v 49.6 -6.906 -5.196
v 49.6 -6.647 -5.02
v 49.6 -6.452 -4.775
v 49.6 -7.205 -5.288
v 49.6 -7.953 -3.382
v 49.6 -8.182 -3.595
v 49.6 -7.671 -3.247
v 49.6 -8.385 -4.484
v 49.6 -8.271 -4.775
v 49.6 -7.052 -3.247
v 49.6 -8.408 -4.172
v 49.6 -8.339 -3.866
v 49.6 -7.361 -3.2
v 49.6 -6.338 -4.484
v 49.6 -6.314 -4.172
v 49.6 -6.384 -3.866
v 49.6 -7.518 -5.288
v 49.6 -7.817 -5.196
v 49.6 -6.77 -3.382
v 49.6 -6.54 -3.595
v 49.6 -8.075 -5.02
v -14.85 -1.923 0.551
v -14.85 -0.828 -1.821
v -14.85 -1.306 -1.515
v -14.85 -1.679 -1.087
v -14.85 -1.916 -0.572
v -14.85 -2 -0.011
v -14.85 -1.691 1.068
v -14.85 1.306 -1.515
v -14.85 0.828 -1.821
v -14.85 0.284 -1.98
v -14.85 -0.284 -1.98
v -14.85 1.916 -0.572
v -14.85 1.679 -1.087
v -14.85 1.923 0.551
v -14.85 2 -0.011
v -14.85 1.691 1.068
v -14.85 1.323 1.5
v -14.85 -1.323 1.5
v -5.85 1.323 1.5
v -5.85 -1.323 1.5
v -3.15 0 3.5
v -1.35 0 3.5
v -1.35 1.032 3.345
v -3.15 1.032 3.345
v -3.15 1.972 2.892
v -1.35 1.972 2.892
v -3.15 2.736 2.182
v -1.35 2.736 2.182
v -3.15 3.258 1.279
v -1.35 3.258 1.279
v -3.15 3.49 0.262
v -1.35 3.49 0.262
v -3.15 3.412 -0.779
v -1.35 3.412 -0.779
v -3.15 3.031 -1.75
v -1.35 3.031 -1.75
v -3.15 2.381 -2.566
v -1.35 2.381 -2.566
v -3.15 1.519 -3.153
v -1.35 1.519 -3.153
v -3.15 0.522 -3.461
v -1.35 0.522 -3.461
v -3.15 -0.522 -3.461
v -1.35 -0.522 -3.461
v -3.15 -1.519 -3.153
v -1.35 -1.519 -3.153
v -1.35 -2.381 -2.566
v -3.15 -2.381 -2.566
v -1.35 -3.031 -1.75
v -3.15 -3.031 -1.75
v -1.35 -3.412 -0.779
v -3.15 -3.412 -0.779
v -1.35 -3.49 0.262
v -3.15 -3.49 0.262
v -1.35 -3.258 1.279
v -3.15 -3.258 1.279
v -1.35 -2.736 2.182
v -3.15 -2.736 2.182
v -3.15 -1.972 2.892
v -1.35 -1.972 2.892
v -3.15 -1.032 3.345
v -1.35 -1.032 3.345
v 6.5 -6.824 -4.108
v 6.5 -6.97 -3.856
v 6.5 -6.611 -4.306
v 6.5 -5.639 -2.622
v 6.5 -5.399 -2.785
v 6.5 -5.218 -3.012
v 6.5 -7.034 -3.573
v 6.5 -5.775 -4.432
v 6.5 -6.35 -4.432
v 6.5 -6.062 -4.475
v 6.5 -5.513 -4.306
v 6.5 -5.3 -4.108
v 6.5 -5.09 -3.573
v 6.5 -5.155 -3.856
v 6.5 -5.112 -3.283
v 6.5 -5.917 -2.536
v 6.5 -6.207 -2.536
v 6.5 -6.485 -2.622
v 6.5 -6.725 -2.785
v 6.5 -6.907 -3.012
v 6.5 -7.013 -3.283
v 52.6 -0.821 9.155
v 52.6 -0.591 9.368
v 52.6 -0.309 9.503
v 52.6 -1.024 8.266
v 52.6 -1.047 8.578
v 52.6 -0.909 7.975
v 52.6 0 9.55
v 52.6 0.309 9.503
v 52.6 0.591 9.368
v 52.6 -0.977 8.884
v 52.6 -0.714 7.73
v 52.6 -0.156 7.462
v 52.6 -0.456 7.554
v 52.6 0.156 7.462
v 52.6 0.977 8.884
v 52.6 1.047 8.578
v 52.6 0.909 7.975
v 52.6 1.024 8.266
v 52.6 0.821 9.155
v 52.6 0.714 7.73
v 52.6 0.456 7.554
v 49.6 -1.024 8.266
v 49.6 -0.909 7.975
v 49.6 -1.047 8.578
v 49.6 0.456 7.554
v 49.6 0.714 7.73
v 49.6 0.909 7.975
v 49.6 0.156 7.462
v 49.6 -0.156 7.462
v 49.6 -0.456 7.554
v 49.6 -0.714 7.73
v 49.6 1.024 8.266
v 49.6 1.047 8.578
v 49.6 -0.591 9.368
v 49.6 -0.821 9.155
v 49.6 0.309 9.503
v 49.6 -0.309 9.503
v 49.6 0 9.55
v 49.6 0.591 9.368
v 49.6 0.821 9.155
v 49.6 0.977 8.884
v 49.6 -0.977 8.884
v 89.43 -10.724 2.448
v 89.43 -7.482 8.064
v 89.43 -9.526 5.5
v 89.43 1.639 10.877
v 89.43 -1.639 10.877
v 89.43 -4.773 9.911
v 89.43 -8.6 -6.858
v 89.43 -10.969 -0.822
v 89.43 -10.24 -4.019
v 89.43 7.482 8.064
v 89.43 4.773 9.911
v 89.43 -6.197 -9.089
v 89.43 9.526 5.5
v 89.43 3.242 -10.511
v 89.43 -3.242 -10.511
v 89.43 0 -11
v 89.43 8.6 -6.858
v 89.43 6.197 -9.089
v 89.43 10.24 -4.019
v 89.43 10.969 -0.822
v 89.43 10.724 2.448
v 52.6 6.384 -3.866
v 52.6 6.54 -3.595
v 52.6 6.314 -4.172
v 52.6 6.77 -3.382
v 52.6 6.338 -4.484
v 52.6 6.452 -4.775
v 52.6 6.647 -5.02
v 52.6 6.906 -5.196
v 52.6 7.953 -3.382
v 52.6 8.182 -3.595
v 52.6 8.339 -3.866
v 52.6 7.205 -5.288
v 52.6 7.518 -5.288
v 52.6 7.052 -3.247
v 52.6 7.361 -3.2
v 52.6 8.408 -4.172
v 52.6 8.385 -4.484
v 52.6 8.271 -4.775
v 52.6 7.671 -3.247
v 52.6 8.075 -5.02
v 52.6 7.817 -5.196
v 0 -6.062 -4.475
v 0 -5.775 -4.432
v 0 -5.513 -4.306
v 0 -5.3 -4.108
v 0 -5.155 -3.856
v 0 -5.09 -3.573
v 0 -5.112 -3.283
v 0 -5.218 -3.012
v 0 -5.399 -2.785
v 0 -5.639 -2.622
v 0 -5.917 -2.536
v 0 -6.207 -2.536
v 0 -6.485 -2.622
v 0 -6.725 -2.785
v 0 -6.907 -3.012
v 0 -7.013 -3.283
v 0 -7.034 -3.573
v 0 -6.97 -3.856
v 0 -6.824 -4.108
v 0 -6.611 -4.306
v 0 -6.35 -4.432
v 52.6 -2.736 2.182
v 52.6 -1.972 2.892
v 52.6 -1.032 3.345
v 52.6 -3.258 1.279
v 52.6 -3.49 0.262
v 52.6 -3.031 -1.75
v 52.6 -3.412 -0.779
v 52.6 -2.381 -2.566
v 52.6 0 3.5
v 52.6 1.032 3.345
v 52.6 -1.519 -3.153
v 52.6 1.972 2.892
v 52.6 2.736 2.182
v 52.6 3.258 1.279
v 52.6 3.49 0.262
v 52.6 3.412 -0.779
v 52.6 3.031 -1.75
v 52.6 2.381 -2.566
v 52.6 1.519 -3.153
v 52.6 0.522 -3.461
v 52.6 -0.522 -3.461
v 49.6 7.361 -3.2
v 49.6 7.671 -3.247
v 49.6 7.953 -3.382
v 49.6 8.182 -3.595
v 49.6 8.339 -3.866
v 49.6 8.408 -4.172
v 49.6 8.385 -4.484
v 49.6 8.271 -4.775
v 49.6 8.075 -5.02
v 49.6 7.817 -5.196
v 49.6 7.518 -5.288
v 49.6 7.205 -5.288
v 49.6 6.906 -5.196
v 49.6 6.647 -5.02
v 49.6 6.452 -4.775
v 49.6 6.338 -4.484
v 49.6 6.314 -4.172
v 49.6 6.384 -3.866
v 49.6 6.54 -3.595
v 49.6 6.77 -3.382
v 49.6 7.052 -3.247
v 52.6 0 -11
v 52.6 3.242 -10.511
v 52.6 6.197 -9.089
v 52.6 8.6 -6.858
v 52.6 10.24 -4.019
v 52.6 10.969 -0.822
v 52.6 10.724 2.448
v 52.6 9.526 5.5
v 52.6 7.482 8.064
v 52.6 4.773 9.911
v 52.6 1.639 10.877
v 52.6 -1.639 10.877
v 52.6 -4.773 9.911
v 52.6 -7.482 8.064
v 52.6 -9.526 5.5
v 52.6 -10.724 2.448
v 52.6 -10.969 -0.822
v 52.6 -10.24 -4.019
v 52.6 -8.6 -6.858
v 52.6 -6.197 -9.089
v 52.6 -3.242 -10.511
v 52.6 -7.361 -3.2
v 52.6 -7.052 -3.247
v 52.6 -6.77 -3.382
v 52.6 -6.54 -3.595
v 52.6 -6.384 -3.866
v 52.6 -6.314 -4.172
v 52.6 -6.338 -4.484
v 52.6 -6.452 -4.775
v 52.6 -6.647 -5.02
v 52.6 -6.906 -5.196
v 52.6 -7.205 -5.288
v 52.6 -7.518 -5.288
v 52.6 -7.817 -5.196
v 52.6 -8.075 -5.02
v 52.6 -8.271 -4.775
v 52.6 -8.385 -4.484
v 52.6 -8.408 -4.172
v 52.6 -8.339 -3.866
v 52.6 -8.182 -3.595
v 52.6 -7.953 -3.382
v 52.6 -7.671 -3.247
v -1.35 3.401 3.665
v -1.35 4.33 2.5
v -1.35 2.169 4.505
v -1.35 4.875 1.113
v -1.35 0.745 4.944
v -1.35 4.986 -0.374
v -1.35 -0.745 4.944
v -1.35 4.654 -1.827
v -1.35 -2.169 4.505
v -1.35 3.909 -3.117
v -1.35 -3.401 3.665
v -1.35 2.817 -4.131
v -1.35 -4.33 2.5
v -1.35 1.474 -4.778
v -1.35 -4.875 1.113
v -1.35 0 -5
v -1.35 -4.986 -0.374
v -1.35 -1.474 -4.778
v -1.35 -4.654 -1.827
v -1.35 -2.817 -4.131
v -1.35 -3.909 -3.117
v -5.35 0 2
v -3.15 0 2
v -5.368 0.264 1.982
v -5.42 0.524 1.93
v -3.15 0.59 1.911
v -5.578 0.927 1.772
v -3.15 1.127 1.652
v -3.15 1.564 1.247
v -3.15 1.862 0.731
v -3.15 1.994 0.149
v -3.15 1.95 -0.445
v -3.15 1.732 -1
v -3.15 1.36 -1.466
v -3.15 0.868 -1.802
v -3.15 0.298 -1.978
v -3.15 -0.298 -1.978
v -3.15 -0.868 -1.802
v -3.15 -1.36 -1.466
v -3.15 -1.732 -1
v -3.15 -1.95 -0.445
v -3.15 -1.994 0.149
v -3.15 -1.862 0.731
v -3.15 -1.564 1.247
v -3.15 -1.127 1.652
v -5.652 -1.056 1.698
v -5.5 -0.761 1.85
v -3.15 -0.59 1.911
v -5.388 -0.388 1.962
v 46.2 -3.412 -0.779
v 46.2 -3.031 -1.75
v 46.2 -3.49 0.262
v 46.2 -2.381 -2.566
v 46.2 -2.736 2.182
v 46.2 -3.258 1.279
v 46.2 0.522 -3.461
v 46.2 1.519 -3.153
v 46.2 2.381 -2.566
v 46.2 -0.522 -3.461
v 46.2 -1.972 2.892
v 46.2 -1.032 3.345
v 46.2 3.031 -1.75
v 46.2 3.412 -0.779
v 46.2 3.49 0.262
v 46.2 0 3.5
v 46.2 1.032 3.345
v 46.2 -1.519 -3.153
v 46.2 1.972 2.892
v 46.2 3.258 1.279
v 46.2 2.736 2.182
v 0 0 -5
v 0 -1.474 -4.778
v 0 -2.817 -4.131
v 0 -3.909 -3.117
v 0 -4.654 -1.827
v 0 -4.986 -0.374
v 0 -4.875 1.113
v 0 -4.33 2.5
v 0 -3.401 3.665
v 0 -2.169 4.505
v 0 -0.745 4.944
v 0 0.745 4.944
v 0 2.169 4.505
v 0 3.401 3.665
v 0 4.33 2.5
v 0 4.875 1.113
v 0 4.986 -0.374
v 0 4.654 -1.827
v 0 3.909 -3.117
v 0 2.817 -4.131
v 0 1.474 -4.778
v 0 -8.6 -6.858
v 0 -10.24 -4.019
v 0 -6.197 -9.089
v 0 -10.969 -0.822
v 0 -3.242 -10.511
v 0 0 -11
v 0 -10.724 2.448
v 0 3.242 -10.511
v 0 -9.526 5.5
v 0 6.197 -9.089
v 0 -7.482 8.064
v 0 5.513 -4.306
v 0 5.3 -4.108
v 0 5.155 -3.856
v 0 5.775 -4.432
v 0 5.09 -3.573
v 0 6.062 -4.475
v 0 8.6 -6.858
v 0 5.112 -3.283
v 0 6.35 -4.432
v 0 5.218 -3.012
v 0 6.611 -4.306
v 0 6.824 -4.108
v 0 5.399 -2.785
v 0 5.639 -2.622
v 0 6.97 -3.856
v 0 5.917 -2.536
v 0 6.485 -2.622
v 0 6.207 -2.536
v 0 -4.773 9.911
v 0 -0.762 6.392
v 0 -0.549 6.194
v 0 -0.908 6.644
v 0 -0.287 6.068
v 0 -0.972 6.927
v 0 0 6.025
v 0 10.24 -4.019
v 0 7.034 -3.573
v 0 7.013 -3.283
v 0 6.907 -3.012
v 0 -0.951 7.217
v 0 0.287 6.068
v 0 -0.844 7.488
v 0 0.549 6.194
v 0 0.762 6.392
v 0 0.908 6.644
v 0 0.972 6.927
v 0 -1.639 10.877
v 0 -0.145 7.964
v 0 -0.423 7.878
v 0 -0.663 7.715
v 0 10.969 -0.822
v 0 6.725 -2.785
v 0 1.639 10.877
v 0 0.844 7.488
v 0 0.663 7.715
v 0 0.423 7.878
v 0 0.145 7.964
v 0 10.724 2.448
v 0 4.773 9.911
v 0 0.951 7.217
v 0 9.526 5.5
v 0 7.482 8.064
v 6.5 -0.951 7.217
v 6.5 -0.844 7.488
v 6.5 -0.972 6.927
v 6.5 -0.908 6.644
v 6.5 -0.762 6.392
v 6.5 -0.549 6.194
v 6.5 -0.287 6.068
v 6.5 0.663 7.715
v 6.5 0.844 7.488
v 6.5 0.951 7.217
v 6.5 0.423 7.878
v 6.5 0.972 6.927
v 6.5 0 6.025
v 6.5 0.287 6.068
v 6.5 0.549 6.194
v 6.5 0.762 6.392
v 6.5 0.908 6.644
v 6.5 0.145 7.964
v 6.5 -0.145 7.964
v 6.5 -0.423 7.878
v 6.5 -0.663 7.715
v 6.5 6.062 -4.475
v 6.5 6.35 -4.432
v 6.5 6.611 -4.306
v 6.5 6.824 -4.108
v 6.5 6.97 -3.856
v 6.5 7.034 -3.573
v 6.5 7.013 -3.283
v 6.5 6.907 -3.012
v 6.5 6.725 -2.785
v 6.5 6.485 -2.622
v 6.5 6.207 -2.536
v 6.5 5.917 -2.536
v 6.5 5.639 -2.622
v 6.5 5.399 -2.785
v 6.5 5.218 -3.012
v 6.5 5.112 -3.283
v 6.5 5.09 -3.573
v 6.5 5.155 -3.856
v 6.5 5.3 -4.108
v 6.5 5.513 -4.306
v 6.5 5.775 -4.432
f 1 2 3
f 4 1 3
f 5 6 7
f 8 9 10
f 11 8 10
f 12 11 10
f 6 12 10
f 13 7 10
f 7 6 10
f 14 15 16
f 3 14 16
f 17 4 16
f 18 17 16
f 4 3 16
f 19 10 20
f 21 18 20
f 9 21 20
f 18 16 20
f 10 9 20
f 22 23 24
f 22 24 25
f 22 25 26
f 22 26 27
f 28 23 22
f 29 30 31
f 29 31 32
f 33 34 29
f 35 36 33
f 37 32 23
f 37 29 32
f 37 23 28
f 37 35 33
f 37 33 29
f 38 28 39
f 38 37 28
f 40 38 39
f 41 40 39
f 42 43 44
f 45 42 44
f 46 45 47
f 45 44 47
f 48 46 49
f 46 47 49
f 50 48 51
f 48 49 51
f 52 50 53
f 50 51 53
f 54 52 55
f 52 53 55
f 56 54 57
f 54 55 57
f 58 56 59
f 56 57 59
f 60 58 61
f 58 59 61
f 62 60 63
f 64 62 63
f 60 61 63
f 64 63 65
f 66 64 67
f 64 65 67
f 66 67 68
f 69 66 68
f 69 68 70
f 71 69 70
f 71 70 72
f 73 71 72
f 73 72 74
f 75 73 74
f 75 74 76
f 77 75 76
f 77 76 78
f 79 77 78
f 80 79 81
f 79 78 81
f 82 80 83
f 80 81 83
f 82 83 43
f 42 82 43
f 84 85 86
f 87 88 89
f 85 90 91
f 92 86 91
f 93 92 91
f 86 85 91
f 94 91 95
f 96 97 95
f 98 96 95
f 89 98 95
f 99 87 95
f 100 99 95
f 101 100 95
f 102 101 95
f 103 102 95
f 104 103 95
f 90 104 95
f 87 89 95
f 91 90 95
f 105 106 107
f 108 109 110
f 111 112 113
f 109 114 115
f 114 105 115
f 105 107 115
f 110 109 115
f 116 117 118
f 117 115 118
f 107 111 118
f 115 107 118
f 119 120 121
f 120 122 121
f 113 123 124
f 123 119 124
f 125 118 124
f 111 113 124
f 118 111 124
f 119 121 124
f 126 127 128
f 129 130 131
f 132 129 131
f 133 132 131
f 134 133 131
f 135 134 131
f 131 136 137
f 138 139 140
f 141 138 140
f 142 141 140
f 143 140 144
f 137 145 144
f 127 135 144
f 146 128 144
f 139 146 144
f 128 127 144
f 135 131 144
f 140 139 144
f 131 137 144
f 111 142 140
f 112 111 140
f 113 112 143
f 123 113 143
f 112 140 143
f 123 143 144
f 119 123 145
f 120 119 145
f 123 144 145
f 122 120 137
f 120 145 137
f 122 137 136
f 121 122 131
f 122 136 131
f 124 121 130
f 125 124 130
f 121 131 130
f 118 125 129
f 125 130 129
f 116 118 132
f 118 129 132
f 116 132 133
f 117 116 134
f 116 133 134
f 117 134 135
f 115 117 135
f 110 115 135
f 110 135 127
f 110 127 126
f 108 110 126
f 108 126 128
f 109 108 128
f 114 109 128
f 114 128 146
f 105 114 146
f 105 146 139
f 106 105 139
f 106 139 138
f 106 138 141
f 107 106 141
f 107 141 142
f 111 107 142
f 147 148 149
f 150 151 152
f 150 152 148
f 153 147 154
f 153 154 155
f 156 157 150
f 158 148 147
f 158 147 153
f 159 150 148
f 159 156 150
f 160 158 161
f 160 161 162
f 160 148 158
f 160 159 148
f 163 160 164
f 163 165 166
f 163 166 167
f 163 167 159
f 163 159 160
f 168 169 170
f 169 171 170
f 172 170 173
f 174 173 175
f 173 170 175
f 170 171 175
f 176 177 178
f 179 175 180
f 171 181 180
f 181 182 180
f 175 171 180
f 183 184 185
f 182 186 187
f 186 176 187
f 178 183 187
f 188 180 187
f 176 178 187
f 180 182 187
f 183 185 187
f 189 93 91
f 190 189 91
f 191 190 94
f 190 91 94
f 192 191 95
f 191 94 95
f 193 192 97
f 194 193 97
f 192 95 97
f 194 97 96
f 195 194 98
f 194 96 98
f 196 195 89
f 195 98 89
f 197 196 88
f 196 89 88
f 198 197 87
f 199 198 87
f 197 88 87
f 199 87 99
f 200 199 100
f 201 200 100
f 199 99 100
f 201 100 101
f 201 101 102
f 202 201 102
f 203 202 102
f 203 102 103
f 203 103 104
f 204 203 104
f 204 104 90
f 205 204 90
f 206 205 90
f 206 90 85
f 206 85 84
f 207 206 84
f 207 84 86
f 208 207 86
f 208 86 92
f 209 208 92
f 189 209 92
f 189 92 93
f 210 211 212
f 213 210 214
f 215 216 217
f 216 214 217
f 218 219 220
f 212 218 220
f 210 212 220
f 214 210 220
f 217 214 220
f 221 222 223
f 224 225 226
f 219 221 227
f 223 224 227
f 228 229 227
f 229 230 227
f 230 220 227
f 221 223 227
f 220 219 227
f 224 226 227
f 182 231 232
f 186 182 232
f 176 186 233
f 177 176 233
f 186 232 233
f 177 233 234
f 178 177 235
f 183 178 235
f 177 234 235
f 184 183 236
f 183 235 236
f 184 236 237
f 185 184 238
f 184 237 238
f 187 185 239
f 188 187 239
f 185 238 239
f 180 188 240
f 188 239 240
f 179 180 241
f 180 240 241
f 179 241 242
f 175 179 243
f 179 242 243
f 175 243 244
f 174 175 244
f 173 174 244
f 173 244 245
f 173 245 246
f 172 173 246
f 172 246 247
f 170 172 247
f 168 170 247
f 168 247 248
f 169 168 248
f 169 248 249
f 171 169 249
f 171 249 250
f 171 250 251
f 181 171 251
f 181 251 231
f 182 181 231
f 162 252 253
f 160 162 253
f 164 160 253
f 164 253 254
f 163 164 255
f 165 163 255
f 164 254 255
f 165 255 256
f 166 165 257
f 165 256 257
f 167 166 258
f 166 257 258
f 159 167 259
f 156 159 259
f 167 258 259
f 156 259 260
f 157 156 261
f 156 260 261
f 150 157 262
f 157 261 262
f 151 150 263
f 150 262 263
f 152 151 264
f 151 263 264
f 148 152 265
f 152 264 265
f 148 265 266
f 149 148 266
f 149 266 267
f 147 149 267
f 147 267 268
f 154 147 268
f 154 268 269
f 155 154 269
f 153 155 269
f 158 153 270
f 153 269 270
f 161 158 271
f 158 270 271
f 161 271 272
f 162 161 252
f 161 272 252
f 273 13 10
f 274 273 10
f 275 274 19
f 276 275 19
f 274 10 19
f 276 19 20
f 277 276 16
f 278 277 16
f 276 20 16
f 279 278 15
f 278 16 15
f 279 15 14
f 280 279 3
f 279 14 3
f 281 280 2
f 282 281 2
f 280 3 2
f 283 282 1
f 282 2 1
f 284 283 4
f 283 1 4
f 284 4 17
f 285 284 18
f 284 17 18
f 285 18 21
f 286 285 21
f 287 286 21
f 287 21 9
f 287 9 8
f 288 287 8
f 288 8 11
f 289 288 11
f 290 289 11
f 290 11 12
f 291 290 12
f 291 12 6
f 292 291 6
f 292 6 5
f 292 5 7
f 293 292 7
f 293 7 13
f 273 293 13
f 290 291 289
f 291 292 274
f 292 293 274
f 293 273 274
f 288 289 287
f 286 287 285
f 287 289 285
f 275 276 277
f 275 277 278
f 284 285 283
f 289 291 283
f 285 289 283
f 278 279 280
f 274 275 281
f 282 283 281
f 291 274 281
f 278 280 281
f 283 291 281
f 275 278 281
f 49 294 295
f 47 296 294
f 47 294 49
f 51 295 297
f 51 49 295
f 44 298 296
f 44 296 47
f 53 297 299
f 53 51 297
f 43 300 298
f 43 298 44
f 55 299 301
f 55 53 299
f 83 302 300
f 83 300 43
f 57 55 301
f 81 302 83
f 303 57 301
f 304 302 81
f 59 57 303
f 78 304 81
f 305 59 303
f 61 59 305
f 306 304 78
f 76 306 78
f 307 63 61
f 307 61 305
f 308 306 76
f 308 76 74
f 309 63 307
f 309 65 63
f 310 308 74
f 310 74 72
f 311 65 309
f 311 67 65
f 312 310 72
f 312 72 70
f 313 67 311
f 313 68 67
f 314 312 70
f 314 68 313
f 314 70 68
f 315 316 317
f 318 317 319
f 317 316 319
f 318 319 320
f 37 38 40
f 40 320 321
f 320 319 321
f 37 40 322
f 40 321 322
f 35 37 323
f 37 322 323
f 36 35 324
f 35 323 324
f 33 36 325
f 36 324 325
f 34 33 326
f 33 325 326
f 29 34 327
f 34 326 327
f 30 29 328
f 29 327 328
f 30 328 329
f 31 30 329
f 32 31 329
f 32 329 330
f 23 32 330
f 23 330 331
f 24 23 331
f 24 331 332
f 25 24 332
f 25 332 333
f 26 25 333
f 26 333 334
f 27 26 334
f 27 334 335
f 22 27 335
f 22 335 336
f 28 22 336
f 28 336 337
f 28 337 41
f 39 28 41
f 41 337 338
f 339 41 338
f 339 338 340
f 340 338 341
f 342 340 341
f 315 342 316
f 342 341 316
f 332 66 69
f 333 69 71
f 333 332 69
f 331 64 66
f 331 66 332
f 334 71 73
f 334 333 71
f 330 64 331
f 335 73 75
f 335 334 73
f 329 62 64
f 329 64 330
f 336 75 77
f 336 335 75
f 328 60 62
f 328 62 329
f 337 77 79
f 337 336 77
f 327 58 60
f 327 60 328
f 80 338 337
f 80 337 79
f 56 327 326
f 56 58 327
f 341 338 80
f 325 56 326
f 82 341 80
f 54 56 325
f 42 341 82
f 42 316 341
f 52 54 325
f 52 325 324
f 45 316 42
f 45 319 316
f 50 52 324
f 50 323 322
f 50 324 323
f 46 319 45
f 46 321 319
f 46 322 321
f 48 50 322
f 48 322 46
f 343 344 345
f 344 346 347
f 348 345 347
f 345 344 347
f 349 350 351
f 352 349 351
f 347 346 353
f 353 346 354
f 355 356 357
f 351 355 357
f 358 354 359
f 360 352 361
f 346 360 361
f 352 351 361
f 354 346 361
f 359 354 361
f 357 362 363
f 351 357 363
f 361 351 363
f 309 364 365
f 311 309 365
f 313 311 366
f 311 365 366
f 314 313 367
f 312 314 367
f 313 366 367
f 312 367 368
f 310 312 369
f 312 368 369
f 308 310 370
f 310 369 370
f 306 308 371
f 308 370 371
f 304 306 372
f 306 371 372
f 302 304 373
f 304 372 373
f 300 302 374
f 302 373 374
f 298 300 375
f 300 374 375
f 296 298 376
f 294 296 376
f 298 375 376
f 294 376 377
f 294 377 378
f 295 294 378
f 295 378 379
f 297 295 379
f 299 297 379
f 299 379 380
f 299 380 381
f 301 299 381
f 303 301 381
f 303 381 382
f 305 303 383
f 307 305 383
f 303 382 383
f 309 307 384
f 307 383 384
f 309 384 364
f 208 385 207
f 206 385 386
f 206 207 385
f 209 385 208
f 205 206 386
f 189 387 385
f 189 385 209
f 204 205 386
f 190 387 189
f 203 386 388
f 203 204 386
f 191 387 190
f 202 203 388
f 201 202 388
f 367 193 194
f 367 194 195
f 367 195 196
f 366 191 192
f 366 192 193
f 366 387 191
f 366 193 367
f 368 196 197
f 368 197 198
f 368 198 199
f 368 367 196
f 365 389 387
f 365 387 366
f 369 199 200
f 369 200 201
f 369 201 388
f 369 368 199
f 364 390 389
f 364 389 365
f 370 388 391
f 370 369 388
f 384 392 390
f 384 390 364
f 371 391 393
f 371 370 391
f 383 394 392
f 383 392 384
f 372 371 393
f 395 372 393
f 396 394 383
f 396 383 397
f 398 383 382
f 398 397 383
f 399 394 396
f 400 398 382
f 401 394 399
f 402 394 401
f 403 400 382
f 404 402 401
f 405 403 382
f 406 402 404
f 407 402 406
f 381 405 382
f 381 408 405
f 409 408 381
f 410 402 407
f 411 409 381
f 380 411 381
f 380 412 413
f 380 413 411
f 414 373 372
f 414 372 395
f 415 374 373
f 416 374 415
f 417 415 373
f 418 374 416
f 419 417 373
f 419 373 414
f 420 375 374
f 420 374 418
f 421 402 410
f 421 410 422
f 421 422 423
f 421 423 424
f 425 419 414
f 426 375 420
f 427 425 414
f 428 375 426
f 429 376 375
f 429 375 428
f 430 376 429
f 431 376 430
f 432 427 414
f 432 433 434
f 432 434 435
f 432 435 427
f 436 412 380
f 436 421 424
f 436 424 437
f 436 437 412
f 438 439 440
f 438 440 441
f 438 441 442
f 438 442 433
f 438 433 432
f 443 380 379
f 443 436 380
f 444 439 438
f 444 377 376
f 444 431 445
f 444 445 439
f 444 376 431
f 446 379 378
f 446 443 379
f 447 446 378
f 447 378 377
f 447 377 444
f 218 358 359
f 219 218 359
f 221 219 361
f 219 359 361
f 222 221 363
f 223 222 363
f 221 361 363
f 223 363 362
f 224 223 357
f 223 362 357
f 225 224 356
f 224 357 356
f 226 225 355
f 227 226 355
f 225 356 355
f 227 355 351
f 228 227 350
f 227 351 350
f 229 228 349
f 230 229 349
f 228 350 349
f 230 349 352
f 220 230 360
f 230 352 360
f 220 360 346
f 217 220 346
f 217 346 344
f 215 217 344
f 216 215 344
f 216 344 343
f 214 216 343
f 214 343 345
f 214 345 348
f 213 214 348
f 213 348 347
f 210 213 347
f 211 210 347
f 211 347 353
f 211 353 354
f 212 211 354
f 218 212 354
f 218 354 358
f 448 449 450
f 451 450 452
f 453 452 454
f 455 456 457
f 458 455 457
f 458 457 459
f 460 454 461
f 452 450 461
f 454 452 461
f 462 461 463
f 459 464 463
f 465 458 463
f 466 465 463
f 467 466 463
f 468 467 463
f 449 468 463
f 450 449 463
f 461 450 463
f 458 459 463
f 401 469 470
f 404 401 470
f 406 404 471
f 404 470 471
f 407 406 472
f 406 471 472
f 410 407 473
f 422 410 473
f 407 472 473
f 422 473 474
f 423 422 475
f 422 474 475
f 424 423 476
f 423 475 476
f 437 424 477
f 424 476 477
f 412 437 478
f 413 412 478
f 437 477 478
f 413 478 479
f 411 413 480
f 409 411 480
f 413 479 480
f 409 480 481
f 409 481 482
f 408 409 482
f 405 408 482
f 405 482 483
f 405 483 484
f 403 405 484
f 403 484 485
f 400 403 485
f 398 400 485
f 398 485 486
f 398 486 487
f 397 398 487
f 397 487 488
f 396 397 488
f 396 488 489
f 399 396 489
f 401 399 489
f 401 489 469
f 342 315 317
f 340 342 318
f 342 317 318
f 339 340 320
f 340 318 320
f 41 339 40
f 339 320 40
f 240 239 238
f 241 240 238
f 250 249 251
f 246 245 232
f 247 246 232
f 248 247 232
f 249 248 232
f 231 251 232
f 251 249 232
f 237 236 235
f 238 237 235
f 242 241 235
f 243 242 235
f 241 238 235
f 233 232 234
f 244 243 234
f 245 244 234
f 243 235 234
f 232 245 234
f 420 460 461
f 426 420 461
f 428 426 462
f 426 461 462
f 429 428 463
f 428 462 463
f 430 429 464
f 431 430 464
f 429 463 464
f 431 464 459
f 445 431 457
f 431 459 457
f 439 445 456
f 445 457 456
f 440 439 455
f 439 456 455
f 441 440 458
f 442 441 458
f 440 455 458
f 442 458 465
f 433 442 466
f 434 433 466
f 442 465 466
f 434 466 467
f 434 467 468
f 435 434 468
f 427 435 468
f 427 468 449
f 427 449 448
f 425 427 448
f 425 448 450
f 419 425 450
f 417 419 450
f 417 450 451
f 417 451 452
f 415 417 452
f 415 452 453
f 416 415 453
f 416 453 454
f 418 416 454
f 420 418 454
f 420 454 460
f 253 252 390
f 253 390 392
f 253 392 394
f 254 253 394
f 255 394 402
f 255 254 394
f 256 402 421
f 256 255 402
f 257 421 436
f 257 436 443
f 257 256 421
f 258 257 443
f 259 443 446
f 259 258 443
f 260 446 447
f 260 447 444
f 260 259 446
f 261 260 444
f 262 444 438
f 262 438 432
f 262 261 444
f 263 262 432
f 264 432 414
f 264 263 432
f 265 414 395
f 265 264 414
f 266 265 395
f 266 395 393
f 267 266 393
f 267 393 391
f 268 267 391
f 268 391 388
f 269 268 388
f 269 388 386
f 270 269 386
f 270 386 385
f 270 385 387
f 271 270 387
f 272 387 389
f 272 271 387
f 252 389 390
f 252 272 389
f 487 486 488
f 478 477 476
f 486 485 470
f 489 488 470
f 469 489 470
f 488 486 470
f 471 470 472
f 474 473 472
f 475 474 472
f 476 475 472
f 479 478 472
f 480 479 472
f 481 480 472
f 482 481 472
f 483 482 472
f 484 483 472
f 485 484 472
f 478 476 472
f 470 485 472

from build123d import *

# Parameters (mm, degrees)
SKETCH1_W           = 52.6
SKETCH1_H           = 11
SKETCH2_R           = 5
BOSS_EXTRUDE1_DEPTH = 1.35
SKETCH3_R           = 3.5
BOSS_EXTRUDE2_DEPTH = 1.8
SKETCH4_R           = 2
BOSS_EXTRUDE3_DEPTH = 11.7
CUT_EXTRUDE1_REACH  = 71.221
HOLE1_D             = 1.95
HOLE1_DEPTH         = 6.5
HOLE2_D             = 1.95
HOLE2_DEPTH         = 6.5
HOLE3_D             = 1.95
HOLE3_DEPTH         = 6.5
HOLE4_D             = 7
HOLE4_DEPTH         = 6.4
HOLE5_D             = 2.1
HOLE5_DEPTH         = 3
HOLE6_D             = 2.1
HOLE6_DEPTH         = 3
HOLE7_D             = 2.1
HOLE7_DEPTH         = 3
SKETCH25_R          = 11
BOSS_EXTRUDE4_DEPTH = 36.83


with BuildPart() as part:
    # Sketch1 → Revolve1 (revolve)
    with BuildSketch(Plane.XY, mode=Mode.PRIVATE) as revolve1_sk:
        with Locations((26.3, 5.5)):
            Rectangle(SKETCH1_W, SKETCH1_H)
    revolve(revolve1_sk.sketch.rotate(Axis((0, 0, 0), (1, 0, 0)), 270), axis=Axis((0, 0, 0), (1, 0, 0)))

    # Sketch2 → Boss-Extrude1 (add)
    with BuildSketch(Plane.ZY):
        with Locations(Location((0, 0, 0), (0, 0, 180))):
            Circle(SKETCH2_R)
    extrude(amount=BOSS_EXTRUDE1_DEPTH)

    # Sketch3 → Boss-Extrude2 (add)
    with BuildSketch(Plane.ZY.offset(1.35)):
        Circle(SKETCH3_R)
    extrude(amount=BOSS_EXTRUDE2_DEPTH)

    # Sketch4 → Boss-Extrude3 (add)
    with BuildSketch(Plane.ZY.offset(3.15)):
        Circle(SKETCH4_R)
    extrude(amount=BOSS_EXTRUDE3_DEPTH)

    # Cut-Extrude1: up to this plane
    cut_extrude1_end = Plane(origin=(-3.675, 0, 3.675), z_dir=(0.707106781186547, 0, -0.707106781186548))
    # Sketch6 → Cut-Extrude1 (cut, up to the surface)
    with BuildSketch(Plane.ZY.offset(14.85), mode=Mode.PRIVATE) as cut_extrude1_sk1:
        with BuildLine():
            Line((1.5, 1.322875656), (1.5, -1.322875656))
            ThreePointArc((1.5, -1.322875656), (2, 0), (1.5, 1.322875656))
        make_face()
    cut_extrude1_tool1 = split(extrude(cut_extrude1_sk1.sketch, amount=-CUT_EXTRUDE1_REACH, mode=Mode.PRIVATE), bisect_by=cut_extrude1_end, keep=Keep.BOTH, mode=Mode.PRIVATE)
    add(cut_extrude1_tool1.solids().sort_by_distance((-14.85, 0, 1.702311))[0], mode=Mode.SUBTRACT)

    # Hole1
    with Locations(Plane.ZY):
        with Locations((7, 0)):
            Hole(HOLE1_D / 2, depth=HOLE1_DEPTH)

    # Hole2
    with Locations(Plane.ZY):
        with Locations((-3.5, -6.062177826)):
            Hole(HOLE2_D / 2, depth=HOLE2_DEPTH)

    # Hole3
    with Locations(Plane.ZY):
        with Locations((-3.5, 6.062177826)):
            Hole(HOLE3_D / 2, depth=HOLE3_DEPTH)

    # Hole4
    with Locations(Plane(origin=(52.6, 0, 0), x_dir=(0, 0, -1), z_dir=(1, 0, 0))):
        with Locations((0, 0)):
            Hole(HOLE4_D / 2, depth=HOLE4_DEPTH)

    # Hole5
    with Locations(Plane(origin=(52.6, 0, 0), x_dir=(0, 0, -1), z_dir=(1, 0, 0))):
        with Locations((-8.5, 0)):
            Hole(HOLE5_D / 2, depth=HOLE5_DEPTH)

    # Hole6
    with Locations(Plane(origin=(52.6, 0, 0), x_dir=(0, 0, -1), z_dir=(1, 0, 0))):
        with Locations((4.25, -7.361215932)):
            Hole(HOLE6_D / 2, depth=HOLE6_DEPTH)

    # Hole7
    with Locations(Plane(origin=(52.6, 0, 0), x_dir=(0, 0, -1), z_dir=(1, 0, 0))):
        with Locations((4.25, 7.361215932)):
            Hole(HOLE7_D / 2, depth=HOLE7_DEPTH)

    # Sketch25 → Boss-Extrude4 (add)
    with BuildSketch(Plane(origin=(52.6, 0, 0), x_dir=(0, 0, -1), z_dir=(1, 0, 0))):
        Circle(SKETCH25_R)
    extrude(amount=BOSS_EXTRUDE4_DEPTH)


solid = part.part
